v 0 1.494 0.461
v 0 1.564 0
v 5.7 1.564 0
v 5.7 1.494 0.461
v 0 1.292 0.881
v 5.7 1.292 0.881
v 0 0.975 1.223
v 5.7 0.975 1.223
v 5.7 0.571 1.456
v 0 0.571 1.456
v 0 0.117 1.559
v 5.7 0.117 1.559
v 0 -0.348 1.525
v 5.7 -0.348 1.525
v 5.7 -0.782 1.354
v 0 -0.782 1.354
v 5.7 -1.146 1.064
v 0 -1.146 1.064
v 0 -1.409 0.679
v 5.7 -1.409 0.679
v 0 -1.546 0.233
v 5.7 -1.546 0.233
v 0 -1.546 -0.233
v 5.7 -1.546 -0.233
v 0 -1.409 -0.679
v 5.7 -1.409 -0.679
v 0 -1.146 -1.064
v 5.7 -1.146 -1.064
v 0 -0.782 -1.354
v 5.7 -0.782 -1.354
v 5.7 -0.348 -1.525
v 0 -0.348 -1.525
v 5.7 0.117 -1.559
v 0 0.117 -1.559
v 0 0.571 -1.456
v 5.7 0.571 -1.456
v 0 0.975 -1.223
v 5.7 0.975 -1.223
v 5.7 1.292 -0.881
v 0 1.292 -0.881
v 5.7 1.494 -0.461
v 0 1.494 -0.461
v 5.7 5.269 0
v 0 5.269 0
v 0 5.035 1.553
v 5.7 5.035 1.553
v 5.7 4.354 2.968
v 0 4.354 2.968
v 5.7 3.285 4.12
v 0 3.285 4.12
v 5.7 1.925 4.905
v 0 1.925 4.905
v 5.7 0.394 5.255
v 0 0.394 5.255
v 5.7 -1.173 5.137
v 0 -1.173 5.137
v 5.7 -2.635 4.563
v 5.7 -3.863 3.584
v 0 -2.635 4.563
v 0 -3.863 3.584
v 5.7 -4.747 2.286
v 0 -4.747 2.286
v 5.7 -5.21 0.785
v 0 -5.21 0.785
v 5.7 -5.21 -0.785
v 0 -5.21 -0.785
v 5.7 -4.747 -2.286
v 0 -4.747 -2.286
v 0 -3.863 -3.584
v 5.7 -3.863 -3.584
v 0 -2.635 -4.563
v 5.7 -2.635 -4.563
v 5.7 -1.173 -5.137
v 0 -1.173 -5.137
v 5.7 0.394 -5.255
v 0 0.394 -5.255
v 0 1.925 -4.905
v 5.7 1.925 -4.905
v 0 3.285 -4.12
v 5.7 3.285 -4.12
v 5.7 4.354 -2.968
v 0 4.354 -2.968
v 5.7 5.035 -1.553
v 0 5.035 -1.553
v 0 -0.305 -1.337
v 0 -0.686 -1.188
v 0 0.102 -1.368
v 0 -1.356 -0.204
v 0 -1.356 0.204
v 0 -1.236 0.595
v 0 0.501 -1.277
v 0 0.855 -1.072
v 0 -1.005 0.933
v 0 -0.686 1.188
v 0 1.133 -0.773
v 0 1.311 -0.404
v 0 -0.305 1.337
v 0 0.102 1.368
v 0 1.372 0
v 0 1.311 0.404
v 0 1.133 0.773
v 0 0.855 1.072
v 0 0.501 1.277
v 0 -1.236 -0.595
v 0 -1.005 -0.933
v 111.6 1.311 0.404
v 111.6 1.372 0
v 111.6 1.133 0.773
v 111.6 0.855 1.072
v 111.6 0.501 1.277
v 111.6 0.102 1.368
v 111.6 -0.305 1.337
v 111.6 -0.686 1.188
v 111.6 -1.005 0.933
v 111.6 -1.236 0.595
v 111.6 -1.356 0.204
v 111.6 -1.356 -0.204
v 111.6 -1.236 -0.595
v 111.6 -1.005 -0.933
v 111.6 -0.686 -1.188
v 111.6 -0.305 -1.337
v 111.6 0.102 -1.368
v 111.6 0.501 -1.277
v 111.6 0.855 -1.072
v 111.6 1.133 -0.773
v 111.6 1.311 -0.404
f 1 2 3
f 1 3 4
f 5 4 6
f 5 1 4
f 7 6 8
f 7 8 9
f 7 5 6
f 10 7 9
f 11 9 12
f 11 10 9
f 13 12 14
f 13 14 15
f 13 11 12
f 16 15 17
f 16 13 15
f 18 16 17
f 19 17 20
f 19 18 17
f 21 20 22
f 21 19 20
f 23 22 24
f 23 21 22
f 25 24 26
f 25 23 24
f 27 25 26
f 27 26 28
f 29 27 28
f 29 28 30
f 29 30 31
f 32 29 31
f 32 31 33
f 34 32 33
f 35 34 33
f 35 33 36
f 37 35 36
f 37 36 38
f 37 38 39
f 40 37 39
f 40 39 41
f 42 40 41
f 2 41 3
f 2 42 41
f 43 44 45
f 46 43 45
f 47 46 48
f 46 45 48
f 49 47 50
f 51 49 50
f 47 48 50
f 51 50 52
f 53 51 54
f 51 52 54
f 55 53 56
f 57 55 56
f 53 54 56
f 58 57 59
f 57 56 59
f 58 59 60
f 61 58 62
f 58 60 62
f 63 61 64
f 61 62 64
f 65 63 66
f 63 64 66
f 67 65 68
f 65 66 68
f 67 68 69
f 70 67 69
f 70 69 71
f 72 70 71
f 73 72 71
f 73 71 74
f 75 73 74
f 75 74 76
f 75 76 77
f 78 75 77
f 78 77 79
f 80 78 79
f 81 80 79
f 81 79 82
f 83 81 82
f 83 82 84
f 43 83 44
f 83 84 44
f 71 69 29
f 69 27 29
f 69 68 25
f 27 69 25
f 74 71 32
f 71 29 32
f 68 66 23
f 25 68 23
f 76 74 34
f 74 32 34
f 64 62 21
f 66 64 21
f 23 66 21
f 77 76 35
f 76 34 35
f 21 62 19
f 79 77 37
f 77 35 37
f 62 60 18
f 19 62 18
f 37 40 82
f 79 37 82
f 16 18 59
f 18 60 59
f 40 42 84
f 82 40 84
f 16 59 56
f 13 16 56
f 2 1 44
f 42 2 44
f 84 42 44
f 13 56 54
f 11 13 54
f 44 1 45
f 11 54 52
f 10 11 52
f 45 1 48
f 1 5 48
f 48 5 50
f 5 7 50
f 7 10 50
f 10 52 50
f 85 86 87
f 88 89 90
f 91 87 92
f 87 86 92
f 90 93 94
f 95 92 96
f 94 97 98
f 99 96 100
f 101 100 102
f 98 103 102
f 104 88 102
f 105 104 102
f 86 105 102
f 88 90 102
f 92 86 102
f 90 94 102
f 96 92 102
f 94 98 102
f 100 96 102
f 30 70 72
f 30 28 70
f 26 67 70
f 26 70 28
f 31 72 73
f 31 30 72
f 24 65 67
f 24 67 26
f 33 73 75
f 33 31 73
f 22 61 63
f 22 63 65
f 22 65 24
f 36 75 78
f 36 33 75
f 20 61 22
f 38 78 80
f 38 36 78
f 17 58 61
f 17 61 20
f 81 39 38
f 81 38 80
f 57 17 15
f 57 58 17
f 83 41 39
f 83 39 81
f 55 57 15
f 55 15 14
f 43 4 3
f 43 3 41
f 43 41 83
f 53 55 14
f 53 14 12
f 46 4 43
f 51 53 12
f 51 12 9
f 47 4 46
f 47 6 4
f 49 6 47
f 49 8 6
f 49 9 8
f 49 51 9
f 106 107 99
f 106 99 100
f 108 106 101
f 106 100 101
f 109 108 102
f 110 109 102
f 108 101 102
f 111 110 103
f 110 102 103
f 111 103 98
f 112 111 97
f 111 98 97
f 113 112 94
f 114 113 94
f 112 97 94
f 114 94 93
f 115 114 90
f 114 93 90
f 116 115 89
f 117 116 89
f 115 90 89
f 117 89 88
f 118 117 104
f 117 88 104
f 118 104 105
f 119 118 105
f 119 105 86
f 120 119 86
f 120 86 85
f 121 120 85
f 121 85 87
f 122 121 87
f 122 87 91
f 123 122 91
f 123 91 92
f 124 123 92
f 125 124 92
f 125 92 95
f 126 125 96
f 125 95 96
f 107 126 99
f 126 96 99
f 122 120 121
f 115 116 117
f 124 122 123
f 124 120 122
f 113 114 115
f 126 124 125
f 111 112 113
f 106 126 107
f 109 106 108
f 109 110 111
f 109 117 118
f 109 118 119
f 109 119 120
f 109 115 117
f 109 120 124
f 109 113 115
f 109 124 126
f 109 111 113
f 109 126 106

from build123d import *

# Parameters (mm, degrees)
F0_R     = 1.371543
F1_DEPTH = 111.6
F2_R     = 5.269297
F2_R_2   = 1.5638
F3_DEPTH = 5.7


with BuildPart() as f1:
    # F0 (on Right) → F1 (new body)
    with BuildSketch(Plane.YZ):
        Circle(F0_R)
    extrude(amount=F1_DEPTH)


with BuildPart() as f3:
    # F2 (on Right) → F3 (new body)
    with BuildSketch(Plane.YZ):
        Circle(F2_R)
        Circle(F2_R_2, mode=Mode.SUBTRACT)
    extrude(amount=F3_DEPTH)


solid = Compound([f1.part, f3.part])
